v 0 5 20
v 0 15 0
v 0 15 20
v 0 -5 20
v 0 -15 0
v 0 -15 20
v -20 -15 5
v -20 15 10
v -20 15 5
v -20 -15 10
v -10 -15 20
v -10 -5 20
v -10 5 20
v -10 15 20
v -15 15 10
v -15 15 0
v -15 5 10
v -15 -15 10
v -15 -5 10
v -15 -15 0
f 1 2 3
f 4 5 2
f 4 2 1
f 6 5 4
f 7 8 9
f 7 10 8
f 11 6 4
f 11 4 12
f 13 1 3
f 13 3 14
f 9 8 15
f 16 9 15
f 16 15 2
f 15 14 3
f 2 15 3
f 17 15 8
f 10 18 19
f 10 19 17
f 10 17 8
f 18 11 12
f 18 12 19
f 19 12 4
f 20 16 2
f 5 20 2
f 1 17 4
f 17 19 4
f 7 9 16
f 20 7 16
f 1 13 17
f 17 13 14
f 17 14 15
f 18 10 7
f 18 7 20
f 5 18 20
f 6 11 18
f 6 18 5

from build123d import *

# Parameters (mm, degrees)
F1_DEPTH = 15
F2_DEPTH = 5


with BuildPart() as f1:
    # F0 (on Front) → F1 (new body, symmetric)
    with BuildSketch(Plane.XZ):
        Polygon((-15, 0), (0, 0), (0, 20), (-15, 10), (-20, 10), (-20, 5), align=None)
        Polygon((-15, 10), (0, 20), (-10, 20), align=None)
    extrude(amount=F1_DEPTH, both=True)

    # F0 (on Front) → F2 (cut, symmetric)
    with BuildSketch(Plane.XZ):
        Polygon((-15, 10), (0, 20), (-10, 20), align=None)
    extrude(amount=F2_DEPTH, both=True, mode=Mode.SUBTRACT)


solid = f1.part
